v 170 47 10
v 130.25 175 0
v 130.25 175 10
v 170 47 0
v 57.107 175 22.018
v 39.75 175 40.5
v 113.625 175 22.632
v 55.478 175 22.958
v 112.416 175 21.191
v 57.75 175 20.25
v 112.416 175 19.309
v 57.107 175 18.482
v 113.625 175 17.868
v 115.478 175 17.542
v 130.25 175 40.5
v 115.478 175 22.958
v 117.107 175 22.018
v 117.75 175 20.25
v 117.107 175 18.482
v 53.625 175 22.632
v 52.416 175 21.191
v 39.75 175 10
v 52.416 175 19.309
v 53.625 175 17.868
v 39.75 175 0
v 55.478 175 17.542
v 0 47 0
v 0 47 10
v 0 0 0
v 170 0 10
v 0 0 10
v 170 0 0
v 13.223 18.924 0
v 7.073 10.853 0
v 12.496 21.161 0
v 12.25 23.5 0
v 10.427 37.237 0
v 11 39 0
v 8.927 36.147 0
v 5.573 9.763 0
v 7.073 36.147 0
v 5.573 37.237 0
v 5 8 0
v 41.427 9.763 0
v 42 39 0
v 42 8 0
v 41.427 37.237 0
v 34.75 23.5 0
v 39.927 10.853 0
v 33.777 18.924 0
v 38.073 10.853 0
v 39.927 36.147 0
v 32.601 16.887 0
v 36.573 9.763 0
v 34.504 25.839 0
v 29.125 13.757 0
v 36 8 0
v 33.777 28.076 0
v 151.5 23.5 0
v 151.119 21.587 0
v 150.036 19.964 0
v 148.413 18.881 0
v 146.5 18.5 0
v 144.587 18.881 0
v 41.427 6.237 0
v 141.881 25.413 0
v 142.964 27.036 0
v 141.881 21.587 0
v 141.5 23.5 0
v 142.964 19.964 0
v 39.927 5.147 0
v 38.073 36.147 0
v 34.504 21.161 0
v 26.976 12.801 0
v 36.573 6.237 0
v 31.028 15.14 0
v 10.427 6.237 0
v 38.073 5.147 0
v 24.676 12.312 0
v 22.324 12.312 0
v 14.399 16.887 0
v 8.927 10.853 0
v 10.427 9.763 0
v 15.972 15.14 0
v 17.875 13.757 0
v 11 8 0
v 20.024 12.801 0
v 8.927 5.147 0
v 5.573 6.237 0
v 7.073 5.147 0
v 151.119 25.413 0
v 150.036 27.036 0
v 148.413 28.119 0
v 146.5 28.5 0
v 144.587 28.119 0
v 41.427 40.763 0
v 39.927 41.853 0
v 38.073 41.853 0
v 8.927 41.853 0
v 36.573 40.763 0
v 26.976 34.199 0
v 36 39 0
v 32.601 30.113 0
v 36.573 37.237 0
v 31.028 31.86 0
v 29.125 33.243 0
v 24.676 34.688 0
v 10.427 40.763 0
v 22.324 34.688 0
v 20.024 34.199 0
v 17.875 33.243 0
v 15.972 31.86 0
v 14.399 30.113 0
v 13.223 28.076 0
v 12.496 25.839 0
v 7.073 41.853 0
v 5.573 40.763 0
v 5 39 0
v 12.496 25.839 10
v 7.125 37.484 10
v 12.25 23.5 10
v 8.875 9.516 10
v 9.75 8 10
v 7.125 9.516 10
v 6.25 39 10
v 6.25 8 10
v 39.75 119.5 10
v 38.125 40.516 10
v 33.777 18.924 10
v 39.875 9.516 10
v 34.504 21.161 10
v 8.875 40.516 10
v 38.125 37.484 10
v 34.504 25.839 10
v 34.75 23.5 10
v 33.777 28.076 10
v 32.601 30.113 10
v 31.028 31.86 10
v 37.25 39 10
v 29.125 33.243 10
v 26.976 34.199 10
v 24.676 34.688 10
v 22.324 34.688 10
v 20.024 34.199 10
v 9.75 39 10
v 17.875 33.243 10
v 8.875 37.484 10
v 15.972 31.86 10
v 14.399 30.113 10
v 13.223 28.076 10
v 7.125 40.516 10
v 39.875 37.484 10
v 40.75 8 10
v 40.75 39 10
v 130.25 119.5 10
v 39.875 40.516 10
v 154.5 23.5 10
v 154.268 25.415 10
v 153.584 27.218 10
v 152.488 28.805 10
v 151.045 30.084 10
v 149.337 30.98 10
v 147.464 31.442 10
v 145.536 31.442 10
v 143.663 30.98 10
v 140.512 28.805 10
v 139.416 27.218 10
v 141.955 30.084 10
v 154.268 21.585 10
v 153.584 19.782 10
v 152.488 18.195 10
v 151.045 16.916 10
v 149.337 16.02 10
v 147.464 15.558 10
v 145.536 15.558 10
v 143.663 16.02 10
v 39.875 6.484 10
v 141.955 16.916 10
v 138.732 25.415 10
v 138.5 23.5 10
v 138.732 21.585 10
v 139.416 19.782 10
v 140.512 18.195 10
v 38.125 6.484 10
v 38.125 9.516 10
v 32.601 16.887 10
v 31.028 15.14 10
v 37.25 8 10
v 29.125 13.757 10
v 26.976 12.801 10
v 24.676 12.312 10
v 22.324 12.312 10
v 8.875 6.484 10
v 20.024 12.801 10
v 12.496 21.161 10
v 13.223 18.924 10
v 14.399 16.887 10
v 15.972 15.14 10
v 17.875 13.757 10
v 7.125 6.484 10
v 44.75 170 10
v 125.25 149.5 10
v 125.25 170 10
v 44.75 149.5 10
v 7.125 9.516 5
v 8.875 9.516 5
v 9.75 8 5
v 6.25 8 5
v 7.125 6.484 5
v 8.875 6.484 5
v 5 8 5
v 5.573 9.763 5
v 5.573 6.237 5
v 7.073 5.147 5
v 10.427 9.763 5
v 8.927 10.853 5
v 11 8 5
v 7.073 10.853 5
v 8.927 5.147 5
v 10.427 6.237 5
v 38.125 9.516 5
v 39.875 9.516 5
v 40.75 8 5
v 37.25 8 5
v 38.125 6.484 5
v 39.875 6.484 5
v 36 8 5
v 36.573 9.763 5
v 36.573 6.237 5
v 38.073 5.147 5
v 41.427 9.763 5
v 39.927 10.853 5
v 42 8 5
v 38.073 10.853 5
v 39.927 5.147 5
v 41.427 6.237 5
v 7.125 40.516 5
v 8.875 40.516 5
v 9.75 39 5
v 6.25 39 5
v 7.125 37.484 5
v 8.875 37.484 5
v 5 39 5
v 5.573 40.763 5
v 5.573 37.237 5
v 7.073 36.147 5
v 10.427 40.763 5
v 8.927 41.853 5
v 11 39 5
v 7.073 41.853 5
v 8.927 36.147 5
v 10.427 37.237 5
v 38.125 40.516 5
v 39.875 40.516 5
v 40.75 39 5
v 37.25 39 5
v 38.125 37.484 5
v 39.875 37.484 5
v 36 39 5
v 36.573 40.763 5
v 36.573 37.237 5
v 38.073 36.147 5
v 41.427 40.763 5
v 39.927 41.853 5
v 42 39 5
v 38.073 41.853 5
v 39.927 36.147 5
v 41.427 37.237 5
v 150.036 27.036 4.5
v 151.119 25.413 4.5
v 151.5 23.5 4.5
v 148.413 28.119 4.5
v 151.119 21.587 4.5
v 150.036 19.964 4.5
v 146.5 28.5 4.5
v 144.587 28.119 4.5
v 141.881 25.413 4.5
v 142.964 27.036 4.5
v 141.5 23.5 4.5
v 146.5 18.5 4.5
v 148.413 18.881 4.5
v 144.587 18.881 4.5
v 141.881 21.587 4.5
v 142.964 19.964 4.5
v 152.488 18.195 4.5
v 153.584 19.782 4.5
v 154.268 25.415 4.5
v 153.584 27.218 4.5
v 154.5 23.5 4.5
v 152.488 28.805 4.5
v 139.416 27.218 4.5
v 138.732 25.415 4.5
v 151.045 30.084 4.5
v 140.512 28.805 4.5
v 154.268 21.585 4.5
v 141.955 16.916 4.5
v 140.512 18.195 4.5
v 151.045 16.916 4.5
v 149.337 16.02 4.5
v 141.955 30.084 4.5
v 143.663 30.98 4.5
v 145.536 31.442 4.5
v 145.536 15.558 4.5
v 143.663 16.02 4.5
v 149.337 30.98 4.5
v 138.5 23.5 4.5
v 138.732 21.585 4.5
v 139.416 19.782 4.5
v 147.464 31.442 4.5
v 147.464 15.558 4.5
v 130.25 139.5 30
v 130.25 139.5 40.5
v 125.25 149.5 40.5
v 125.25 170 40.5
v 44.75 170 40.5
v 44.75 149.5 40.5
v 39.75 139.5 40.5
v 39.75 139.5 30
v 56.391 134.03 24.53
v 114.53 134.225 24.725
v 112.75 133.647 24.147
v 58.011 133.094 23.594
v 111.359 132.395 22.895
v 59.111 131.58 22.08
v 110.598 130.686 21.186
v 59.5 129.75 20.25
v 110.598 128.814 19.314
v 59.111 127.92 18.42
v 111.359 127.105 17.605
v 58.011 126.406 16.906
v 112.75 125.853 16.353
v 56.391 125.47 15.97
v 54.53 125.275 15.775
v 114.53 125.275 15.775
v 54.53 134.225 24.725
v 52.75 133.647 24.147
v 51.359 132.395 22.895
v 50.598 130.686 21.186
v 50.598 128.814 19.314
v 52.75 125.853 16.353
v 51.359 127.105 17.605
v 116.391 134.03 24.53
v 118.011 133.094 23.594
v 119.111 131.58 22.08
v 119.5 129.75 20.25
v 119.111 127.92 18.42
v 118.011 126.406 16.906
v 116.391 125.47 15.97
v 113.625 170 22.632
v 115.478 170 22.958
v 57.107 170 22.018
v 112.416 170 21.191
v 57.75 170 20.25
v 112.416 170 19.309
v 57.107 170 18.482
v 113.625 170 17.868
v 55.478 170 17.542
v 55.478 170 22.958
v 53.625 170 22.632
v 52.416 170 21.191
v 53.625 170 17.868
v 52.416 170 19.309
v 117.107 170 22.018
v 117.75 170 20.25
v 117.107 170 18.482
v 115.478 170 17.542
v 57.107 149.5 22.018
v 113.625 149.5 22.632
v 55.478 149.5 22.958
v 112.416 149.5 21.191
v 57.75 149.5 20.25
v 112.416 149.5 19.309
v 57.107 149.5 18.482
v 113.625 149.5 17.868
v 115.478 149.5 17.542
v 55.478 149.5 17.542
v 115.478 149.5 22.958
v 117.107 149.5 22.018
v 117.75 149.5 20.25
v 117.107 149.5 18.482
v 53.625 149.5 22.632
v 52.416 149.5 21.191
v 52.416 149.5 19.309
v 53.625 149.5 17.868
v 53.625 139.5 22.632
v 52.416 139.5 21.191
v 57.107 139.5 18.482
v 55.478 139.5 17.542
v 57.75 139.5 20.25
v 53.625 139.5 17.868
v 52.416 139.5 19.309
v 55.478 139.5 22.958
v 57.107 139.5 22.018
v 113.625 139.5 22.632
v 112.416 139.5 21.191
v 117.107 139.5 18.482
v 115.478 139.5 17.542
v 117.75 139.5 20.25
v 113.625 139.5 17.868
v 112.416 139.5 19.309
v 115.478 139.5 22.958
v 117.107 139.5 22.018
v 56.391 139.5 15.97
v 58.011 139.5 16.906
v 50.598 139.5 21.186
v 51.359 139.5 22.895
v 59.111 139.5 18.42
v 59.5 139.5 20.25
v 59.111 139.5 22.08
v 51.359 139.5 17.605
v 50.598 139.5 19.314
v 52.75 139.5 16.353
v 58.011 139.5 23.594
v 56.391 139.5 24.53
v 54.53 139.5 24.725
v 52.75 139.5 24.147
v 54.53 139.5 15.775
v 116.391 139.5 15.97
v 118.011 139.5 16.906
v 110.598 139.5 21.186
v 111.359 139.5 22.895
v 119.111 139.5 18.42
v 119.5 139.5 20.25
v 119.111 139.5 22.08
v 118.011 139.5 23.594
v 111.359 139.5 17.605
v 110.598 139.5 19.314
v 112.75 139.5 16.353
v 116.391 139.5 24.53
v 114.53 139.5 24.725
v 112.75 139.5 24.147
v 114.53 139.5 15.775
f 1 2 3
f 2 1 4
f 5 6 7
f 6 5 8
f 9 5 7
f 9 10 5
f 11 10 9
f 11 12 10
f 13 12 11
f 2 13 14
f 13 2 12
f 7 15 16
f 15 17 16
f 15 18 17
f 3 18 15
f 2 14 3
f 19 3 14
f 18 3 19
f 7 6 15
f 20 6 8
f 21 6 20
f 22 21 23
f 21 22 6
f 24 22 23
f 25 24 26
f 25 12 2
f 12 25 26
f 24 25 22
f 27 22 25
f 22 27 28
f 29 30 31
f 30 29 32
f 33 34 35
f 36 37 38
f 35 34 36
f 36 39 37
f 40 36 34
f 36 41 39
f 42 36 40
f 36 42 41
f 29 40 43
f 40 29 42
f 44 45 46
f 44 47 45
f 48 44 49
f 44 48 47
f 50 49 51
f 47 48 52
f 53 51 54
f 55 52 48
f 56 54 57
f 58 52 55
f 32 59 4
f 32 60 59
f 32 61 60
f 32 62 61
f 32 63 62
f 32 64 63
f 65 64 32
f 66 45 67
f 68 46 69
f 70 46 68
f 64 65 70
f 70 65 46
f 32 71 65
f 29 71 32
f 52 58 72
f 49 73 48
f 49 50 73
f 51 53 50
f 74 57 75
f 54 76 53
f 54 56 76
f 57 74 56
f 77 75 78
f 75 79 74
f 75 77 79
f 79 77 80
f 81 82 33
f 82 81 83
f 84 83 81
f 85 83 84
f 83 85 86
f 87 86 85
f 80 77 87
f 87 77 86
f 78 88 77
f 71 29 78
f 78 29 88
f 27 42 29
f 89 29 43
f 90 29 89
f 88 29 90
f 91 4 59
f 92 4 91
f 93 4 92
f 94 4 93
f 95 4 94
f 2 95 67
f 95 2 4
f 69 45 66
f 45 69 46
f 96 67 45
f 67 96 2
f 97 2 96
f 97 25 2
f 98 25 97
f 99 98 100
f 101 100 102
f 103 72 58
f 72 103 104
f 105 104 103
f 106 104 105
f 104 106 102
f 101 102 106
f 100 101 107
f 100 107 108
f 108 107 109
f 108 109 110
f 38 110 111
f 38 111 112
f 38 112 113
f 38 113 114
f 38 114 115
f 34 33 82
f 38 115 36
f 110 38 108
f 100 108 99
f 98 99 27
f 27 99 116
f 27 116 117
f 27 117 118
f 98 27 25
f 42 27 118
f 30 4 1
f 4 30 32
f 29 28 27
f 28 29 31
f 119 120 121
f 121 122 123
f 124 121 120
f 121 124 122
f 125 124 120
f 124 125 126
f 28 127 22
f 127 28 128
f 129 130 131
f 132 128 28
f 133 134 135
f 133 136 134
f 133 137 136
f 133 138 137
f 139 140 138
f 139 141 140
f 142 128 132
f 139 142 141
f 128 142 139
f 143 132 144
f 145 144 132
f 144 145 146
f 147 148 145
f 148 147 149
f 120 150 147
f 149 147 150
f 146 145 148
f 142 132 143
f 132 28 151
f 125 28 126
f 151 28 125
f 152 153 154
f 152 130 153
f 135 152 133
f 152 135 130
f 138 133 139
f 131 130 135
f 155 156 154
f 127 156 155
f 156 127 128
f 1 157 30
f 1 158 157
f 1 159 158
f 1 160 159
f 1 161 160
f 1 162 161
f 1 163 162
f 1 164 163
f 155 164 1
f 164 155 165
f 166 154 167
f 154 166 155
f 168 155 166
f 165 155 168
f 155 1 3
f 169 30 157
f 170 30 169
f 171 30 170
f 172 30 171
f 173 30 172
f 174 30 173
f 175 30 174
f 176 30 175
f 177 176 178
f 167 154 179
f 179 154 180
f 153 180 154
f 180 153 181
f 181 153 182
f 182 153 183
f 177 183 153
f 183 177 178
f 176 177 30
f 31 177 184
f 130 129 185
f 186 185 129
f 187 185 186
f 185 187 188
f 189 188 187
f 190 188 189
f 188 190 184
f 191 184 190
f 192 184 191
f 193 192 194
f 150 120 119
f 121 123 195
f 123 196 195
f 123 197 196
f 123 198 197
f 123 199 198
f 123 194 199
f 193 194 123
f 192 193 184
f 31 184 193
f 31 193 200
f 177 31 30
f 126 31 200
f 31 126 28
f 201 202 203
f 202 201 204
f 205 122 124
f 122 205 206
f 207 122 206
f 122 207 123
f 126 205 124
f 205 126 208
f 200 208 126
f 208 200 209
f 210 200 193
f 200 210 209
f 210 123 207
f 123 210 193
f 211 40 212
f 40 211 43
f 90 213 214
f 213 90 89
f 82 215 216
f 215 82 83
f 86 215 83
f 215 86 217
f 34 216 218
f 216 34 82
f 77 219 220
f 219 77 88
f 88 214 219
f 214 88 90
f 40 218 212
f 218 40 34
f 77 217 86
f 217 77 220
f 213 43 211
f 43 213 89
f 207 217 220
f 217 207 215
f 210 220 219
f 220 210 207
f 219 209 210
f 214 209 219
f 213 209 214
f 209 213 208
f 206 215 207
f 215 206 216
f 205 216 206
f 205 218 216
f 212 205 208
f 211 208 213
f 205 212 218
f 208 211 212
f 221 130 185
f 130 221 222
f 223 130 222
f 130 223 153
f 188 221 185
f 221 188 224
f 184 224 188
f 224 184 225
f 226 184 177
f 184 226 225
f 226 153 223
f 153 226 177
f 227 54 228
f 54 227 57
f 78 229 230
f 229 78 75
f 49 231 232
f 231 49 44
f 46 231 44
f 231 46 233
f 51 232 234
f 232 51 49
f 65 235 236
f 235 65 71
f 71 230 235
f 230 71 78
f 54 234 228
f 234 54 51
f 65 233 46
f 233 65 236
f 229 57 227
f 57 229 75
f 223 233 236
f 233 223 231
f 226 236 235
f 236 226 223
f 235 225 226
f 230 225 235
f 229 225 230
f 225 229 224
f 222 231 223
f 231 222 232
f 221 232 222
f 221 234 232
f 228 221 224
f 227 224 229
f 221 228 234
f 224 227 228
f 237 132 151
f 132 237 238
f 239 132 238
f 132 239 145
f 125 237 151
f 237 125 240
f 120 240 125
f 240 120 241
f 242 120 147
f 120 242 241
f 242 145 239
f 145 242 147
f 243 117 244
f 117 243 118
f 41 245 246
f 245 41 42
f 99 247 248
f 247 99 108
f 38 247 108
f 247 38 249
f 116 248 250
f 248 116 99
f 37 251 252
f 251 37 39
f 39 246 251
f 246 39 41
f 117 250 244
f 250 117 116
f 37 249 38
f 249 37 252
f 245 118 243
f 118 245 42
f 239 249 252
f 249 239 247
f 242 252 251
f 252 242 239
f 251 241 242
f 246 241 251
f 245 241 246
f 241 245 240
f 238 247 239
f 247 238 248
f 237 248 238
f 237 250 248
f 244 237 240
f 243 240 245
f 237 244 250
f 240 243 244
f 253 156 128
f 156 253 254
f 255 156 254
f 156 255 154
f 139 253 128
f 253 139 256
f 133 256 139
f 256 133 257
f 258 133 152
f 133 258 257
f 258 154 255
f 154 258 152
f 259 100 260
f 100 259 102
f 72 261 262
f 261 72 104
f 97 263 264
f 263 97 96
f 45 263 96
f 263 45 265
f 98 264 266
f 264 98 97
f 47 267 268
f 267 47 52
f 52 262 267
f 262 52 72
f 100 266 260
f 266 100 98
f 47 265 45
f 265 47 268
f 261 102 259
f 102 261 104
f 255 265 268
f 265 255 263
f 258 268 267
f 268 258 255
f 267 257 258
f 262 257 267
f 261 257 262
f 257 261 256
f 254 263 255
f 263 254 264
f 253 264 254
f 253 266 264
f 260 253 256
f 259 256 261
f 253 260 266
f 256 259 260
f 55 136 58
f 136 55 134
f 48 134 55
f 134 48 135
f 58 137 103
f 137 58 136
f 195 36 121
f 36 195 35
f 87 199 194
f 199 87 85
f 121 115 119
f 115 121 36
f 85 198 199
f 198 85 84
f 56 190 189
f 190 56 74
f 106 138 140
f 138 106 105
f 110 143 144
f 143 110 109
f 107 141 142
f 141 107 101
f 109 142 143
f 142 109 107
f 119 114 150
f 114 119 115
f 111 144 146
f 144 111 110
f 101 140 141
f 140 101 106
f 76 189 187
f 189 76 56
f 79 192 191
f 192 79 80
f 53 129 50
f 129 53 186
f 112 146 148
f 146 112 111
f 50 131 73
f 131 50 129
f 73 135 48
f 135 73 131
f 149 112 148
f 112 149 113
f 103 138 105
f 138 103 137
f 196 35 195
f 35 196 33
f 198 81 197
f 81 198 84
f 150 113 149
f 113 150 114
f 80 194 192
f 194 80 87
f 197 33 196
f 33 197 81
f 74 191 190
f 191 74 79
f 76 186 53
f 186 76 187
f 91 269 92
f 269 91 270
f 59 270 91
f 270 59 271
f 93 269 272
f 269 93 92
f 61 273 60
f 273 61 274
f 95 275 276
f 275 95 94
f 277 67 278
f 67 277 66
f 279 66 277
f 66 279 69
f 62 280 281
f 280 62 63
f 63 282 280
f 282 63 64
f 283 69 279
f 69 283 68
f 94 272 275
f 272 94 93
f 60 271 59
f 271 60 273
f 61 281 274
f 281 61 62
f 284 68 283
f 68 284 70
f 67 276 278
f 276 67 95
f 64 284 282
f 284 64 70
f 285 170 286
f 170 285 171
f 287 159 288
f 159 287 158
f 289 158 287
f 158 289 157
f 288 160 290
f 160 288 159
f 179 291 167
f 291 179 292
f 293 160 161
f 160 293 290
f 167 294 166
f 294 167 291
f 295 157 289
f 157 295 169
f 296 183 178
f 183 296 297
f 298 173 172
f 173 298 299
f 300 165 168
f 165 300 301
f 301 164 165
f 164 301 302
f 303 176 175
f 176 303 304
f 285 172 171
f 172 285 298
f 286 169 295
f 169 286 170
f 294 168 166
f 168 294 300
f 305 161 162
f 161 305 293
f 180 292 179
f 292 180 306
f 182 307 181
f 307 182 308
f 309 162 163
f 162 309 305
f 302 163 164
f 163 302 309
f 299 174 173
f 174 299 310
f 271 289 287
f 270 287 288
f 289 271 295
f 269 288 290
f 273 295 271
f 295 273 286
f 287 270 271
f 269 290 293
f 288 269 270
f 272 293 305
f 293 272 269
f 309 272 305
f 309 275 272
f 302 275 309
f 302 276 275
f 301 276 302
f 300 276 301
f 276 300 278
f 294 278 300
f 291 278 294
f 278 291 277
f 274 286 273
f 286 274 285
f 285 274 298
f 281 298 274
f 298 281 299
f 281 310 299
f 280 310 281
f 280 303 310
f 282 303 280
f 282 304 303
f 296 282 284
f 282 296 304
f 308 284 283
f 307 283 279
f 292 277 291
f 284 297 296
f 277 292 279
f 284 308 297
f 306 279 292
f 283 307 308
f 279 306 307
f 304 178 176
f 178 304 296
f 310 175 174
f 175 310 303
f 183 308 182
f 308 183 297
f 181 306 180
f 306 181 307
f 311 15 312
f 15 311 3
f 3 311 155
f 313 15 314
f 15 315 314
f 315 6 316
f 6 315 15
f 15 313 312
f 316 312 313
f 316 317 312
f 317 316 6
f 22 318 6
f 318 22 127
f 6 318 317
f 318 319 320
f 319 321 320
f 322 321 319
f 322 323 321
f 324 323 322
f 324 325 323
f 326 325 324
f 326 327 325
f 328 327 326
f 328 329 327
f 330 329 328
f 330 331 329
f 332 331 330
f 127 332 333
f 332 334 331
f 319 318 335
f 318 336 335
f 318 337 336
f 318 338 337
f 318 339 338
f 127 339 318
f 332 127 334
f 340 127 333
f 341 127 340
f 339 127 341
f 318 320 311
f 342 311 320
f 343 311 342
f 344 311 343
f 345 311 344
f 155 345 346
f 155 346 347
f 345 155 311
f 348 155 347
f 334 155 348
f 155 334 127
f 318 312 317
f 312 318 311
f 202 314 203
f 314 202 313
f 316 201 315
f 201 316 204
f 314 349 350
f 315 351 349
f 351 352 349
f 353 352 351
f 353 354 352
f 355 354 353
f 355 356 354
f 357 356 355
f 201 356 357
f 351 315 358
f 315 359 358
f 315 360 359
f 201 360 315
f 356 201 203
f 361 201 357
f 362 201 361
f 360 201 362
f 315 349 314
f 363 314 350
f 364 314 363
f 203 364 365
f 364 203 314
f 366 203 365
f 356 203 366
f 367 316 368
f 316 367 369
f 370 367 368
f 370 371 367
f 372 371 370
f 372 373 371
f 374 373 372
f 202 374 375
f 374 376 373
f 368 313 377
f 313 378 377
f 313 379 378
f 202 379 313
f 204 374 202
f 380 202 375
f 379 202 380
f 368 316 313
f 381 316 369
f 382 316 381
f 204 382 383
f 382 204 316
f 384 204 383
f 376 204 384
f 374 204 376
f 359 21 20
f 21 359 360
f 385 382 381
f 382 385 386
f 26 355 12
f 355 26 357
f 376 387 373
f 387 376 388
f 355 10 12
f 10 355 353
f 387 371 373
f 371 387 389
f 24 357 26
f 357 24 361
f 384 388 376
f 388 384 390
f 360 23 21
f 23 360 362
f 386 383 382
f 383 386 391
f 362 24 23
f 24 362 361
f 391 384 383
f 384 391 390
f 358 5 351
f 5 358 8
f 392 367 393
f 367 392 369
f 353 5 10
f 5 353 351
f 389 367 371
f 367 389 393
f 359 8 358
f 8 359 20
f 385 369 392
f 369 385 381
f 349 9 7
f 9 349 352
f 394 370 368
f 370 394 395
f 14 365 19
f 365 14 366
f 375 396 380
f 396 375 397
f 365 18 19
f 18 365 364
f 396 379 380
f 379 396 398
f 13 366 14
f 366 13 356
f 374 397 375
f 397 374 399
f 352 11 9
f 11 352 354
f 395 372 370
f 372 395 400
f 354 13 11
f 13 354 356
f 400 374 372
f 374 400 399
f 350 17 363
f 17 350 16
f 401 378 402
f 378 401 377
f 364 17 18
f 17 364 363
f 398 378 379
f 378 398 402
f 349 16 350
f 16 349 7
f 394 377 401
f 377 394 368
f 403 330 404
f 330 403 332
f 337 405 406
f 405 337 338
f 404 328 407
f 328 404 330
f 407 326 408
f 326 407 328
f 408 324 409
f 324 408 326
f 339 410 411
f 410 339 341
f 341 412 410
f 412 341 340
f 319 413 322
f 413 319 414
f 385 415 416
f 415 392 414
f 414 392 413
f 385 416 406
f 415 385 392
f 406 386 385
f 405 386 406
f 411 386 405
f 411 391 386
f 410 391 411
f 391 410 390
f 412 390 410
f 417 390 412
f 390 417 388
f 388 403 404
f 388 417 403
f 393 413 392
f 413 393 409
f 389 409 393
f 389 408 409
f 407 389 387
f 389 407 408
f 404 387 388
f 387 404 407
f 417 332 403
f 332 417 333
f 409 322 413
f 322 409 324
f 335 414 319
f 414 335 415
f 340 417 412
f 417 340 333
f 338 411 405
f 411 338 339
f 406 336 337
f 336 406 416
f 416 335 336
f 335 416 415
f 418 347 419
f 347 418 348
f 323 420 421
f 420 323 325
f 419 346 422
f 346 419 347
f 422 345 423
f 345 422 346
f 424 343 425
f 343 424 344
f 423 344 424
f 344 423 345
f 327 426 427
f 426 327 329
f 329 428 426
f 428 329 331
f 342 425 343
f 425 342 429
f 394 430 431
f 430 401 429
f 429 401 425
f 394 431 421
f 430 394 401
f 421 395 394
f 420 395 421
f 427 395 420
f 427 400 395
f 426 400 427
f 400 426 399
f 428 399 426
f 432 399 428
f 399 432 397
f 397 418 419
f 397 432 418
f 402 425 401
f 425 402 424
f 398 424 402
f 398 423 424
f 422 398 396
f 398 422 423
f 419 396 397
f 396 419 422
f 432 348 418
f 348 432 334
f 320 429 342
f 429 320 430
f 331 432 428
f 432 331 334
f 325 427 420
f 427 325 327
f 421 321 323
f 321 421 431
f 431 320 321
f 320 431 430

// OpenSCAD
// Uncomment before final render
//$fa = 0.01;
//$fs = 0.25;

module yAxisCarriage() {
  union() {
    difference() {
      hull() {
        cube([47, 47, 10]);
        translate([123, 0, 0]) {
          cube([47, 47, 10]);
        }
        translate([39.75, 65, 0]) {
          cube([90.5, 110, 10]);
        }
      }
      translate([8, 8, -1]) {
        cylinder(12, 1.75, 1.75);
      }
      translate([8, 8, -1]) {
        cylinder(6, 3, 3);
      }
      translate([39, 8, -1]) {
        cylinder(12, 1.75, 1.75);
      }
      translate([39, 8, -1]) {
        cylinder(6, 3, 3);
      }
      translate([8, 39, -1]) {
        cylinder(12, 1.75, 1.75);
      }
      translate([8, 39, -1]) {
        cylinder(6, 3, 3);
      }
      translate([39, 39, -1]) {
        cylinder(12, 1.75, 1.75);
      }
      translate([39, 39, -1]) {
        cylinder(6, 3, 3);
      }
      translate([23.5, 23.5, -1]) {
        cylinder(12, 11.25, 11.25);
      }
      translate([146.5, 23.5, -1]) {
        cylinder(12, 5, 5);
      }
      translate([146.5, 23.5, 4.5]) {
        cylinder(6.5, 8, 8);
      }
    }
    translate([39.75, 119.5, 10]) {
      difference() {
        cube([90.5, 55.5, 30.5]);
        translate([-1, 0, 0]) {
          rotate([45, 0, 0]) {
            cube([92.5, sqrt(800), sqrt(800)]);
          }
        }
        translate([-1, -1, 20]) {
          cube([92.5, 21, 11.5]);
        }
        translate([5, 30, -1]) {
          cube([80.5, 20.5, 32.5]);
        }
        translate([15.25, -1, 10.25]) {
          rotate([-90, 0, 0]) {
            cylinder(57.5, 2.75, 2.75);
          }
        }
        translate([75.25, -1, 10.25]) {
          rotate([-90, 0, 0]) {
            cylinder(57.5, 2.75, 2.75);
          }
        }
        translate([15.25, -1, 10.25]) {
          rotate([-90, 0, 0]) {
            cylinder(21, 4.5, 4.5);
          }
        }
        translate([75.25, -1, 10.25]) {
          rotate([-90, 0, 0]) {
            cylinder(21, 4.5, 4.5);
          }
        }
      }
    }
  }
}

yAxisCarriage();
